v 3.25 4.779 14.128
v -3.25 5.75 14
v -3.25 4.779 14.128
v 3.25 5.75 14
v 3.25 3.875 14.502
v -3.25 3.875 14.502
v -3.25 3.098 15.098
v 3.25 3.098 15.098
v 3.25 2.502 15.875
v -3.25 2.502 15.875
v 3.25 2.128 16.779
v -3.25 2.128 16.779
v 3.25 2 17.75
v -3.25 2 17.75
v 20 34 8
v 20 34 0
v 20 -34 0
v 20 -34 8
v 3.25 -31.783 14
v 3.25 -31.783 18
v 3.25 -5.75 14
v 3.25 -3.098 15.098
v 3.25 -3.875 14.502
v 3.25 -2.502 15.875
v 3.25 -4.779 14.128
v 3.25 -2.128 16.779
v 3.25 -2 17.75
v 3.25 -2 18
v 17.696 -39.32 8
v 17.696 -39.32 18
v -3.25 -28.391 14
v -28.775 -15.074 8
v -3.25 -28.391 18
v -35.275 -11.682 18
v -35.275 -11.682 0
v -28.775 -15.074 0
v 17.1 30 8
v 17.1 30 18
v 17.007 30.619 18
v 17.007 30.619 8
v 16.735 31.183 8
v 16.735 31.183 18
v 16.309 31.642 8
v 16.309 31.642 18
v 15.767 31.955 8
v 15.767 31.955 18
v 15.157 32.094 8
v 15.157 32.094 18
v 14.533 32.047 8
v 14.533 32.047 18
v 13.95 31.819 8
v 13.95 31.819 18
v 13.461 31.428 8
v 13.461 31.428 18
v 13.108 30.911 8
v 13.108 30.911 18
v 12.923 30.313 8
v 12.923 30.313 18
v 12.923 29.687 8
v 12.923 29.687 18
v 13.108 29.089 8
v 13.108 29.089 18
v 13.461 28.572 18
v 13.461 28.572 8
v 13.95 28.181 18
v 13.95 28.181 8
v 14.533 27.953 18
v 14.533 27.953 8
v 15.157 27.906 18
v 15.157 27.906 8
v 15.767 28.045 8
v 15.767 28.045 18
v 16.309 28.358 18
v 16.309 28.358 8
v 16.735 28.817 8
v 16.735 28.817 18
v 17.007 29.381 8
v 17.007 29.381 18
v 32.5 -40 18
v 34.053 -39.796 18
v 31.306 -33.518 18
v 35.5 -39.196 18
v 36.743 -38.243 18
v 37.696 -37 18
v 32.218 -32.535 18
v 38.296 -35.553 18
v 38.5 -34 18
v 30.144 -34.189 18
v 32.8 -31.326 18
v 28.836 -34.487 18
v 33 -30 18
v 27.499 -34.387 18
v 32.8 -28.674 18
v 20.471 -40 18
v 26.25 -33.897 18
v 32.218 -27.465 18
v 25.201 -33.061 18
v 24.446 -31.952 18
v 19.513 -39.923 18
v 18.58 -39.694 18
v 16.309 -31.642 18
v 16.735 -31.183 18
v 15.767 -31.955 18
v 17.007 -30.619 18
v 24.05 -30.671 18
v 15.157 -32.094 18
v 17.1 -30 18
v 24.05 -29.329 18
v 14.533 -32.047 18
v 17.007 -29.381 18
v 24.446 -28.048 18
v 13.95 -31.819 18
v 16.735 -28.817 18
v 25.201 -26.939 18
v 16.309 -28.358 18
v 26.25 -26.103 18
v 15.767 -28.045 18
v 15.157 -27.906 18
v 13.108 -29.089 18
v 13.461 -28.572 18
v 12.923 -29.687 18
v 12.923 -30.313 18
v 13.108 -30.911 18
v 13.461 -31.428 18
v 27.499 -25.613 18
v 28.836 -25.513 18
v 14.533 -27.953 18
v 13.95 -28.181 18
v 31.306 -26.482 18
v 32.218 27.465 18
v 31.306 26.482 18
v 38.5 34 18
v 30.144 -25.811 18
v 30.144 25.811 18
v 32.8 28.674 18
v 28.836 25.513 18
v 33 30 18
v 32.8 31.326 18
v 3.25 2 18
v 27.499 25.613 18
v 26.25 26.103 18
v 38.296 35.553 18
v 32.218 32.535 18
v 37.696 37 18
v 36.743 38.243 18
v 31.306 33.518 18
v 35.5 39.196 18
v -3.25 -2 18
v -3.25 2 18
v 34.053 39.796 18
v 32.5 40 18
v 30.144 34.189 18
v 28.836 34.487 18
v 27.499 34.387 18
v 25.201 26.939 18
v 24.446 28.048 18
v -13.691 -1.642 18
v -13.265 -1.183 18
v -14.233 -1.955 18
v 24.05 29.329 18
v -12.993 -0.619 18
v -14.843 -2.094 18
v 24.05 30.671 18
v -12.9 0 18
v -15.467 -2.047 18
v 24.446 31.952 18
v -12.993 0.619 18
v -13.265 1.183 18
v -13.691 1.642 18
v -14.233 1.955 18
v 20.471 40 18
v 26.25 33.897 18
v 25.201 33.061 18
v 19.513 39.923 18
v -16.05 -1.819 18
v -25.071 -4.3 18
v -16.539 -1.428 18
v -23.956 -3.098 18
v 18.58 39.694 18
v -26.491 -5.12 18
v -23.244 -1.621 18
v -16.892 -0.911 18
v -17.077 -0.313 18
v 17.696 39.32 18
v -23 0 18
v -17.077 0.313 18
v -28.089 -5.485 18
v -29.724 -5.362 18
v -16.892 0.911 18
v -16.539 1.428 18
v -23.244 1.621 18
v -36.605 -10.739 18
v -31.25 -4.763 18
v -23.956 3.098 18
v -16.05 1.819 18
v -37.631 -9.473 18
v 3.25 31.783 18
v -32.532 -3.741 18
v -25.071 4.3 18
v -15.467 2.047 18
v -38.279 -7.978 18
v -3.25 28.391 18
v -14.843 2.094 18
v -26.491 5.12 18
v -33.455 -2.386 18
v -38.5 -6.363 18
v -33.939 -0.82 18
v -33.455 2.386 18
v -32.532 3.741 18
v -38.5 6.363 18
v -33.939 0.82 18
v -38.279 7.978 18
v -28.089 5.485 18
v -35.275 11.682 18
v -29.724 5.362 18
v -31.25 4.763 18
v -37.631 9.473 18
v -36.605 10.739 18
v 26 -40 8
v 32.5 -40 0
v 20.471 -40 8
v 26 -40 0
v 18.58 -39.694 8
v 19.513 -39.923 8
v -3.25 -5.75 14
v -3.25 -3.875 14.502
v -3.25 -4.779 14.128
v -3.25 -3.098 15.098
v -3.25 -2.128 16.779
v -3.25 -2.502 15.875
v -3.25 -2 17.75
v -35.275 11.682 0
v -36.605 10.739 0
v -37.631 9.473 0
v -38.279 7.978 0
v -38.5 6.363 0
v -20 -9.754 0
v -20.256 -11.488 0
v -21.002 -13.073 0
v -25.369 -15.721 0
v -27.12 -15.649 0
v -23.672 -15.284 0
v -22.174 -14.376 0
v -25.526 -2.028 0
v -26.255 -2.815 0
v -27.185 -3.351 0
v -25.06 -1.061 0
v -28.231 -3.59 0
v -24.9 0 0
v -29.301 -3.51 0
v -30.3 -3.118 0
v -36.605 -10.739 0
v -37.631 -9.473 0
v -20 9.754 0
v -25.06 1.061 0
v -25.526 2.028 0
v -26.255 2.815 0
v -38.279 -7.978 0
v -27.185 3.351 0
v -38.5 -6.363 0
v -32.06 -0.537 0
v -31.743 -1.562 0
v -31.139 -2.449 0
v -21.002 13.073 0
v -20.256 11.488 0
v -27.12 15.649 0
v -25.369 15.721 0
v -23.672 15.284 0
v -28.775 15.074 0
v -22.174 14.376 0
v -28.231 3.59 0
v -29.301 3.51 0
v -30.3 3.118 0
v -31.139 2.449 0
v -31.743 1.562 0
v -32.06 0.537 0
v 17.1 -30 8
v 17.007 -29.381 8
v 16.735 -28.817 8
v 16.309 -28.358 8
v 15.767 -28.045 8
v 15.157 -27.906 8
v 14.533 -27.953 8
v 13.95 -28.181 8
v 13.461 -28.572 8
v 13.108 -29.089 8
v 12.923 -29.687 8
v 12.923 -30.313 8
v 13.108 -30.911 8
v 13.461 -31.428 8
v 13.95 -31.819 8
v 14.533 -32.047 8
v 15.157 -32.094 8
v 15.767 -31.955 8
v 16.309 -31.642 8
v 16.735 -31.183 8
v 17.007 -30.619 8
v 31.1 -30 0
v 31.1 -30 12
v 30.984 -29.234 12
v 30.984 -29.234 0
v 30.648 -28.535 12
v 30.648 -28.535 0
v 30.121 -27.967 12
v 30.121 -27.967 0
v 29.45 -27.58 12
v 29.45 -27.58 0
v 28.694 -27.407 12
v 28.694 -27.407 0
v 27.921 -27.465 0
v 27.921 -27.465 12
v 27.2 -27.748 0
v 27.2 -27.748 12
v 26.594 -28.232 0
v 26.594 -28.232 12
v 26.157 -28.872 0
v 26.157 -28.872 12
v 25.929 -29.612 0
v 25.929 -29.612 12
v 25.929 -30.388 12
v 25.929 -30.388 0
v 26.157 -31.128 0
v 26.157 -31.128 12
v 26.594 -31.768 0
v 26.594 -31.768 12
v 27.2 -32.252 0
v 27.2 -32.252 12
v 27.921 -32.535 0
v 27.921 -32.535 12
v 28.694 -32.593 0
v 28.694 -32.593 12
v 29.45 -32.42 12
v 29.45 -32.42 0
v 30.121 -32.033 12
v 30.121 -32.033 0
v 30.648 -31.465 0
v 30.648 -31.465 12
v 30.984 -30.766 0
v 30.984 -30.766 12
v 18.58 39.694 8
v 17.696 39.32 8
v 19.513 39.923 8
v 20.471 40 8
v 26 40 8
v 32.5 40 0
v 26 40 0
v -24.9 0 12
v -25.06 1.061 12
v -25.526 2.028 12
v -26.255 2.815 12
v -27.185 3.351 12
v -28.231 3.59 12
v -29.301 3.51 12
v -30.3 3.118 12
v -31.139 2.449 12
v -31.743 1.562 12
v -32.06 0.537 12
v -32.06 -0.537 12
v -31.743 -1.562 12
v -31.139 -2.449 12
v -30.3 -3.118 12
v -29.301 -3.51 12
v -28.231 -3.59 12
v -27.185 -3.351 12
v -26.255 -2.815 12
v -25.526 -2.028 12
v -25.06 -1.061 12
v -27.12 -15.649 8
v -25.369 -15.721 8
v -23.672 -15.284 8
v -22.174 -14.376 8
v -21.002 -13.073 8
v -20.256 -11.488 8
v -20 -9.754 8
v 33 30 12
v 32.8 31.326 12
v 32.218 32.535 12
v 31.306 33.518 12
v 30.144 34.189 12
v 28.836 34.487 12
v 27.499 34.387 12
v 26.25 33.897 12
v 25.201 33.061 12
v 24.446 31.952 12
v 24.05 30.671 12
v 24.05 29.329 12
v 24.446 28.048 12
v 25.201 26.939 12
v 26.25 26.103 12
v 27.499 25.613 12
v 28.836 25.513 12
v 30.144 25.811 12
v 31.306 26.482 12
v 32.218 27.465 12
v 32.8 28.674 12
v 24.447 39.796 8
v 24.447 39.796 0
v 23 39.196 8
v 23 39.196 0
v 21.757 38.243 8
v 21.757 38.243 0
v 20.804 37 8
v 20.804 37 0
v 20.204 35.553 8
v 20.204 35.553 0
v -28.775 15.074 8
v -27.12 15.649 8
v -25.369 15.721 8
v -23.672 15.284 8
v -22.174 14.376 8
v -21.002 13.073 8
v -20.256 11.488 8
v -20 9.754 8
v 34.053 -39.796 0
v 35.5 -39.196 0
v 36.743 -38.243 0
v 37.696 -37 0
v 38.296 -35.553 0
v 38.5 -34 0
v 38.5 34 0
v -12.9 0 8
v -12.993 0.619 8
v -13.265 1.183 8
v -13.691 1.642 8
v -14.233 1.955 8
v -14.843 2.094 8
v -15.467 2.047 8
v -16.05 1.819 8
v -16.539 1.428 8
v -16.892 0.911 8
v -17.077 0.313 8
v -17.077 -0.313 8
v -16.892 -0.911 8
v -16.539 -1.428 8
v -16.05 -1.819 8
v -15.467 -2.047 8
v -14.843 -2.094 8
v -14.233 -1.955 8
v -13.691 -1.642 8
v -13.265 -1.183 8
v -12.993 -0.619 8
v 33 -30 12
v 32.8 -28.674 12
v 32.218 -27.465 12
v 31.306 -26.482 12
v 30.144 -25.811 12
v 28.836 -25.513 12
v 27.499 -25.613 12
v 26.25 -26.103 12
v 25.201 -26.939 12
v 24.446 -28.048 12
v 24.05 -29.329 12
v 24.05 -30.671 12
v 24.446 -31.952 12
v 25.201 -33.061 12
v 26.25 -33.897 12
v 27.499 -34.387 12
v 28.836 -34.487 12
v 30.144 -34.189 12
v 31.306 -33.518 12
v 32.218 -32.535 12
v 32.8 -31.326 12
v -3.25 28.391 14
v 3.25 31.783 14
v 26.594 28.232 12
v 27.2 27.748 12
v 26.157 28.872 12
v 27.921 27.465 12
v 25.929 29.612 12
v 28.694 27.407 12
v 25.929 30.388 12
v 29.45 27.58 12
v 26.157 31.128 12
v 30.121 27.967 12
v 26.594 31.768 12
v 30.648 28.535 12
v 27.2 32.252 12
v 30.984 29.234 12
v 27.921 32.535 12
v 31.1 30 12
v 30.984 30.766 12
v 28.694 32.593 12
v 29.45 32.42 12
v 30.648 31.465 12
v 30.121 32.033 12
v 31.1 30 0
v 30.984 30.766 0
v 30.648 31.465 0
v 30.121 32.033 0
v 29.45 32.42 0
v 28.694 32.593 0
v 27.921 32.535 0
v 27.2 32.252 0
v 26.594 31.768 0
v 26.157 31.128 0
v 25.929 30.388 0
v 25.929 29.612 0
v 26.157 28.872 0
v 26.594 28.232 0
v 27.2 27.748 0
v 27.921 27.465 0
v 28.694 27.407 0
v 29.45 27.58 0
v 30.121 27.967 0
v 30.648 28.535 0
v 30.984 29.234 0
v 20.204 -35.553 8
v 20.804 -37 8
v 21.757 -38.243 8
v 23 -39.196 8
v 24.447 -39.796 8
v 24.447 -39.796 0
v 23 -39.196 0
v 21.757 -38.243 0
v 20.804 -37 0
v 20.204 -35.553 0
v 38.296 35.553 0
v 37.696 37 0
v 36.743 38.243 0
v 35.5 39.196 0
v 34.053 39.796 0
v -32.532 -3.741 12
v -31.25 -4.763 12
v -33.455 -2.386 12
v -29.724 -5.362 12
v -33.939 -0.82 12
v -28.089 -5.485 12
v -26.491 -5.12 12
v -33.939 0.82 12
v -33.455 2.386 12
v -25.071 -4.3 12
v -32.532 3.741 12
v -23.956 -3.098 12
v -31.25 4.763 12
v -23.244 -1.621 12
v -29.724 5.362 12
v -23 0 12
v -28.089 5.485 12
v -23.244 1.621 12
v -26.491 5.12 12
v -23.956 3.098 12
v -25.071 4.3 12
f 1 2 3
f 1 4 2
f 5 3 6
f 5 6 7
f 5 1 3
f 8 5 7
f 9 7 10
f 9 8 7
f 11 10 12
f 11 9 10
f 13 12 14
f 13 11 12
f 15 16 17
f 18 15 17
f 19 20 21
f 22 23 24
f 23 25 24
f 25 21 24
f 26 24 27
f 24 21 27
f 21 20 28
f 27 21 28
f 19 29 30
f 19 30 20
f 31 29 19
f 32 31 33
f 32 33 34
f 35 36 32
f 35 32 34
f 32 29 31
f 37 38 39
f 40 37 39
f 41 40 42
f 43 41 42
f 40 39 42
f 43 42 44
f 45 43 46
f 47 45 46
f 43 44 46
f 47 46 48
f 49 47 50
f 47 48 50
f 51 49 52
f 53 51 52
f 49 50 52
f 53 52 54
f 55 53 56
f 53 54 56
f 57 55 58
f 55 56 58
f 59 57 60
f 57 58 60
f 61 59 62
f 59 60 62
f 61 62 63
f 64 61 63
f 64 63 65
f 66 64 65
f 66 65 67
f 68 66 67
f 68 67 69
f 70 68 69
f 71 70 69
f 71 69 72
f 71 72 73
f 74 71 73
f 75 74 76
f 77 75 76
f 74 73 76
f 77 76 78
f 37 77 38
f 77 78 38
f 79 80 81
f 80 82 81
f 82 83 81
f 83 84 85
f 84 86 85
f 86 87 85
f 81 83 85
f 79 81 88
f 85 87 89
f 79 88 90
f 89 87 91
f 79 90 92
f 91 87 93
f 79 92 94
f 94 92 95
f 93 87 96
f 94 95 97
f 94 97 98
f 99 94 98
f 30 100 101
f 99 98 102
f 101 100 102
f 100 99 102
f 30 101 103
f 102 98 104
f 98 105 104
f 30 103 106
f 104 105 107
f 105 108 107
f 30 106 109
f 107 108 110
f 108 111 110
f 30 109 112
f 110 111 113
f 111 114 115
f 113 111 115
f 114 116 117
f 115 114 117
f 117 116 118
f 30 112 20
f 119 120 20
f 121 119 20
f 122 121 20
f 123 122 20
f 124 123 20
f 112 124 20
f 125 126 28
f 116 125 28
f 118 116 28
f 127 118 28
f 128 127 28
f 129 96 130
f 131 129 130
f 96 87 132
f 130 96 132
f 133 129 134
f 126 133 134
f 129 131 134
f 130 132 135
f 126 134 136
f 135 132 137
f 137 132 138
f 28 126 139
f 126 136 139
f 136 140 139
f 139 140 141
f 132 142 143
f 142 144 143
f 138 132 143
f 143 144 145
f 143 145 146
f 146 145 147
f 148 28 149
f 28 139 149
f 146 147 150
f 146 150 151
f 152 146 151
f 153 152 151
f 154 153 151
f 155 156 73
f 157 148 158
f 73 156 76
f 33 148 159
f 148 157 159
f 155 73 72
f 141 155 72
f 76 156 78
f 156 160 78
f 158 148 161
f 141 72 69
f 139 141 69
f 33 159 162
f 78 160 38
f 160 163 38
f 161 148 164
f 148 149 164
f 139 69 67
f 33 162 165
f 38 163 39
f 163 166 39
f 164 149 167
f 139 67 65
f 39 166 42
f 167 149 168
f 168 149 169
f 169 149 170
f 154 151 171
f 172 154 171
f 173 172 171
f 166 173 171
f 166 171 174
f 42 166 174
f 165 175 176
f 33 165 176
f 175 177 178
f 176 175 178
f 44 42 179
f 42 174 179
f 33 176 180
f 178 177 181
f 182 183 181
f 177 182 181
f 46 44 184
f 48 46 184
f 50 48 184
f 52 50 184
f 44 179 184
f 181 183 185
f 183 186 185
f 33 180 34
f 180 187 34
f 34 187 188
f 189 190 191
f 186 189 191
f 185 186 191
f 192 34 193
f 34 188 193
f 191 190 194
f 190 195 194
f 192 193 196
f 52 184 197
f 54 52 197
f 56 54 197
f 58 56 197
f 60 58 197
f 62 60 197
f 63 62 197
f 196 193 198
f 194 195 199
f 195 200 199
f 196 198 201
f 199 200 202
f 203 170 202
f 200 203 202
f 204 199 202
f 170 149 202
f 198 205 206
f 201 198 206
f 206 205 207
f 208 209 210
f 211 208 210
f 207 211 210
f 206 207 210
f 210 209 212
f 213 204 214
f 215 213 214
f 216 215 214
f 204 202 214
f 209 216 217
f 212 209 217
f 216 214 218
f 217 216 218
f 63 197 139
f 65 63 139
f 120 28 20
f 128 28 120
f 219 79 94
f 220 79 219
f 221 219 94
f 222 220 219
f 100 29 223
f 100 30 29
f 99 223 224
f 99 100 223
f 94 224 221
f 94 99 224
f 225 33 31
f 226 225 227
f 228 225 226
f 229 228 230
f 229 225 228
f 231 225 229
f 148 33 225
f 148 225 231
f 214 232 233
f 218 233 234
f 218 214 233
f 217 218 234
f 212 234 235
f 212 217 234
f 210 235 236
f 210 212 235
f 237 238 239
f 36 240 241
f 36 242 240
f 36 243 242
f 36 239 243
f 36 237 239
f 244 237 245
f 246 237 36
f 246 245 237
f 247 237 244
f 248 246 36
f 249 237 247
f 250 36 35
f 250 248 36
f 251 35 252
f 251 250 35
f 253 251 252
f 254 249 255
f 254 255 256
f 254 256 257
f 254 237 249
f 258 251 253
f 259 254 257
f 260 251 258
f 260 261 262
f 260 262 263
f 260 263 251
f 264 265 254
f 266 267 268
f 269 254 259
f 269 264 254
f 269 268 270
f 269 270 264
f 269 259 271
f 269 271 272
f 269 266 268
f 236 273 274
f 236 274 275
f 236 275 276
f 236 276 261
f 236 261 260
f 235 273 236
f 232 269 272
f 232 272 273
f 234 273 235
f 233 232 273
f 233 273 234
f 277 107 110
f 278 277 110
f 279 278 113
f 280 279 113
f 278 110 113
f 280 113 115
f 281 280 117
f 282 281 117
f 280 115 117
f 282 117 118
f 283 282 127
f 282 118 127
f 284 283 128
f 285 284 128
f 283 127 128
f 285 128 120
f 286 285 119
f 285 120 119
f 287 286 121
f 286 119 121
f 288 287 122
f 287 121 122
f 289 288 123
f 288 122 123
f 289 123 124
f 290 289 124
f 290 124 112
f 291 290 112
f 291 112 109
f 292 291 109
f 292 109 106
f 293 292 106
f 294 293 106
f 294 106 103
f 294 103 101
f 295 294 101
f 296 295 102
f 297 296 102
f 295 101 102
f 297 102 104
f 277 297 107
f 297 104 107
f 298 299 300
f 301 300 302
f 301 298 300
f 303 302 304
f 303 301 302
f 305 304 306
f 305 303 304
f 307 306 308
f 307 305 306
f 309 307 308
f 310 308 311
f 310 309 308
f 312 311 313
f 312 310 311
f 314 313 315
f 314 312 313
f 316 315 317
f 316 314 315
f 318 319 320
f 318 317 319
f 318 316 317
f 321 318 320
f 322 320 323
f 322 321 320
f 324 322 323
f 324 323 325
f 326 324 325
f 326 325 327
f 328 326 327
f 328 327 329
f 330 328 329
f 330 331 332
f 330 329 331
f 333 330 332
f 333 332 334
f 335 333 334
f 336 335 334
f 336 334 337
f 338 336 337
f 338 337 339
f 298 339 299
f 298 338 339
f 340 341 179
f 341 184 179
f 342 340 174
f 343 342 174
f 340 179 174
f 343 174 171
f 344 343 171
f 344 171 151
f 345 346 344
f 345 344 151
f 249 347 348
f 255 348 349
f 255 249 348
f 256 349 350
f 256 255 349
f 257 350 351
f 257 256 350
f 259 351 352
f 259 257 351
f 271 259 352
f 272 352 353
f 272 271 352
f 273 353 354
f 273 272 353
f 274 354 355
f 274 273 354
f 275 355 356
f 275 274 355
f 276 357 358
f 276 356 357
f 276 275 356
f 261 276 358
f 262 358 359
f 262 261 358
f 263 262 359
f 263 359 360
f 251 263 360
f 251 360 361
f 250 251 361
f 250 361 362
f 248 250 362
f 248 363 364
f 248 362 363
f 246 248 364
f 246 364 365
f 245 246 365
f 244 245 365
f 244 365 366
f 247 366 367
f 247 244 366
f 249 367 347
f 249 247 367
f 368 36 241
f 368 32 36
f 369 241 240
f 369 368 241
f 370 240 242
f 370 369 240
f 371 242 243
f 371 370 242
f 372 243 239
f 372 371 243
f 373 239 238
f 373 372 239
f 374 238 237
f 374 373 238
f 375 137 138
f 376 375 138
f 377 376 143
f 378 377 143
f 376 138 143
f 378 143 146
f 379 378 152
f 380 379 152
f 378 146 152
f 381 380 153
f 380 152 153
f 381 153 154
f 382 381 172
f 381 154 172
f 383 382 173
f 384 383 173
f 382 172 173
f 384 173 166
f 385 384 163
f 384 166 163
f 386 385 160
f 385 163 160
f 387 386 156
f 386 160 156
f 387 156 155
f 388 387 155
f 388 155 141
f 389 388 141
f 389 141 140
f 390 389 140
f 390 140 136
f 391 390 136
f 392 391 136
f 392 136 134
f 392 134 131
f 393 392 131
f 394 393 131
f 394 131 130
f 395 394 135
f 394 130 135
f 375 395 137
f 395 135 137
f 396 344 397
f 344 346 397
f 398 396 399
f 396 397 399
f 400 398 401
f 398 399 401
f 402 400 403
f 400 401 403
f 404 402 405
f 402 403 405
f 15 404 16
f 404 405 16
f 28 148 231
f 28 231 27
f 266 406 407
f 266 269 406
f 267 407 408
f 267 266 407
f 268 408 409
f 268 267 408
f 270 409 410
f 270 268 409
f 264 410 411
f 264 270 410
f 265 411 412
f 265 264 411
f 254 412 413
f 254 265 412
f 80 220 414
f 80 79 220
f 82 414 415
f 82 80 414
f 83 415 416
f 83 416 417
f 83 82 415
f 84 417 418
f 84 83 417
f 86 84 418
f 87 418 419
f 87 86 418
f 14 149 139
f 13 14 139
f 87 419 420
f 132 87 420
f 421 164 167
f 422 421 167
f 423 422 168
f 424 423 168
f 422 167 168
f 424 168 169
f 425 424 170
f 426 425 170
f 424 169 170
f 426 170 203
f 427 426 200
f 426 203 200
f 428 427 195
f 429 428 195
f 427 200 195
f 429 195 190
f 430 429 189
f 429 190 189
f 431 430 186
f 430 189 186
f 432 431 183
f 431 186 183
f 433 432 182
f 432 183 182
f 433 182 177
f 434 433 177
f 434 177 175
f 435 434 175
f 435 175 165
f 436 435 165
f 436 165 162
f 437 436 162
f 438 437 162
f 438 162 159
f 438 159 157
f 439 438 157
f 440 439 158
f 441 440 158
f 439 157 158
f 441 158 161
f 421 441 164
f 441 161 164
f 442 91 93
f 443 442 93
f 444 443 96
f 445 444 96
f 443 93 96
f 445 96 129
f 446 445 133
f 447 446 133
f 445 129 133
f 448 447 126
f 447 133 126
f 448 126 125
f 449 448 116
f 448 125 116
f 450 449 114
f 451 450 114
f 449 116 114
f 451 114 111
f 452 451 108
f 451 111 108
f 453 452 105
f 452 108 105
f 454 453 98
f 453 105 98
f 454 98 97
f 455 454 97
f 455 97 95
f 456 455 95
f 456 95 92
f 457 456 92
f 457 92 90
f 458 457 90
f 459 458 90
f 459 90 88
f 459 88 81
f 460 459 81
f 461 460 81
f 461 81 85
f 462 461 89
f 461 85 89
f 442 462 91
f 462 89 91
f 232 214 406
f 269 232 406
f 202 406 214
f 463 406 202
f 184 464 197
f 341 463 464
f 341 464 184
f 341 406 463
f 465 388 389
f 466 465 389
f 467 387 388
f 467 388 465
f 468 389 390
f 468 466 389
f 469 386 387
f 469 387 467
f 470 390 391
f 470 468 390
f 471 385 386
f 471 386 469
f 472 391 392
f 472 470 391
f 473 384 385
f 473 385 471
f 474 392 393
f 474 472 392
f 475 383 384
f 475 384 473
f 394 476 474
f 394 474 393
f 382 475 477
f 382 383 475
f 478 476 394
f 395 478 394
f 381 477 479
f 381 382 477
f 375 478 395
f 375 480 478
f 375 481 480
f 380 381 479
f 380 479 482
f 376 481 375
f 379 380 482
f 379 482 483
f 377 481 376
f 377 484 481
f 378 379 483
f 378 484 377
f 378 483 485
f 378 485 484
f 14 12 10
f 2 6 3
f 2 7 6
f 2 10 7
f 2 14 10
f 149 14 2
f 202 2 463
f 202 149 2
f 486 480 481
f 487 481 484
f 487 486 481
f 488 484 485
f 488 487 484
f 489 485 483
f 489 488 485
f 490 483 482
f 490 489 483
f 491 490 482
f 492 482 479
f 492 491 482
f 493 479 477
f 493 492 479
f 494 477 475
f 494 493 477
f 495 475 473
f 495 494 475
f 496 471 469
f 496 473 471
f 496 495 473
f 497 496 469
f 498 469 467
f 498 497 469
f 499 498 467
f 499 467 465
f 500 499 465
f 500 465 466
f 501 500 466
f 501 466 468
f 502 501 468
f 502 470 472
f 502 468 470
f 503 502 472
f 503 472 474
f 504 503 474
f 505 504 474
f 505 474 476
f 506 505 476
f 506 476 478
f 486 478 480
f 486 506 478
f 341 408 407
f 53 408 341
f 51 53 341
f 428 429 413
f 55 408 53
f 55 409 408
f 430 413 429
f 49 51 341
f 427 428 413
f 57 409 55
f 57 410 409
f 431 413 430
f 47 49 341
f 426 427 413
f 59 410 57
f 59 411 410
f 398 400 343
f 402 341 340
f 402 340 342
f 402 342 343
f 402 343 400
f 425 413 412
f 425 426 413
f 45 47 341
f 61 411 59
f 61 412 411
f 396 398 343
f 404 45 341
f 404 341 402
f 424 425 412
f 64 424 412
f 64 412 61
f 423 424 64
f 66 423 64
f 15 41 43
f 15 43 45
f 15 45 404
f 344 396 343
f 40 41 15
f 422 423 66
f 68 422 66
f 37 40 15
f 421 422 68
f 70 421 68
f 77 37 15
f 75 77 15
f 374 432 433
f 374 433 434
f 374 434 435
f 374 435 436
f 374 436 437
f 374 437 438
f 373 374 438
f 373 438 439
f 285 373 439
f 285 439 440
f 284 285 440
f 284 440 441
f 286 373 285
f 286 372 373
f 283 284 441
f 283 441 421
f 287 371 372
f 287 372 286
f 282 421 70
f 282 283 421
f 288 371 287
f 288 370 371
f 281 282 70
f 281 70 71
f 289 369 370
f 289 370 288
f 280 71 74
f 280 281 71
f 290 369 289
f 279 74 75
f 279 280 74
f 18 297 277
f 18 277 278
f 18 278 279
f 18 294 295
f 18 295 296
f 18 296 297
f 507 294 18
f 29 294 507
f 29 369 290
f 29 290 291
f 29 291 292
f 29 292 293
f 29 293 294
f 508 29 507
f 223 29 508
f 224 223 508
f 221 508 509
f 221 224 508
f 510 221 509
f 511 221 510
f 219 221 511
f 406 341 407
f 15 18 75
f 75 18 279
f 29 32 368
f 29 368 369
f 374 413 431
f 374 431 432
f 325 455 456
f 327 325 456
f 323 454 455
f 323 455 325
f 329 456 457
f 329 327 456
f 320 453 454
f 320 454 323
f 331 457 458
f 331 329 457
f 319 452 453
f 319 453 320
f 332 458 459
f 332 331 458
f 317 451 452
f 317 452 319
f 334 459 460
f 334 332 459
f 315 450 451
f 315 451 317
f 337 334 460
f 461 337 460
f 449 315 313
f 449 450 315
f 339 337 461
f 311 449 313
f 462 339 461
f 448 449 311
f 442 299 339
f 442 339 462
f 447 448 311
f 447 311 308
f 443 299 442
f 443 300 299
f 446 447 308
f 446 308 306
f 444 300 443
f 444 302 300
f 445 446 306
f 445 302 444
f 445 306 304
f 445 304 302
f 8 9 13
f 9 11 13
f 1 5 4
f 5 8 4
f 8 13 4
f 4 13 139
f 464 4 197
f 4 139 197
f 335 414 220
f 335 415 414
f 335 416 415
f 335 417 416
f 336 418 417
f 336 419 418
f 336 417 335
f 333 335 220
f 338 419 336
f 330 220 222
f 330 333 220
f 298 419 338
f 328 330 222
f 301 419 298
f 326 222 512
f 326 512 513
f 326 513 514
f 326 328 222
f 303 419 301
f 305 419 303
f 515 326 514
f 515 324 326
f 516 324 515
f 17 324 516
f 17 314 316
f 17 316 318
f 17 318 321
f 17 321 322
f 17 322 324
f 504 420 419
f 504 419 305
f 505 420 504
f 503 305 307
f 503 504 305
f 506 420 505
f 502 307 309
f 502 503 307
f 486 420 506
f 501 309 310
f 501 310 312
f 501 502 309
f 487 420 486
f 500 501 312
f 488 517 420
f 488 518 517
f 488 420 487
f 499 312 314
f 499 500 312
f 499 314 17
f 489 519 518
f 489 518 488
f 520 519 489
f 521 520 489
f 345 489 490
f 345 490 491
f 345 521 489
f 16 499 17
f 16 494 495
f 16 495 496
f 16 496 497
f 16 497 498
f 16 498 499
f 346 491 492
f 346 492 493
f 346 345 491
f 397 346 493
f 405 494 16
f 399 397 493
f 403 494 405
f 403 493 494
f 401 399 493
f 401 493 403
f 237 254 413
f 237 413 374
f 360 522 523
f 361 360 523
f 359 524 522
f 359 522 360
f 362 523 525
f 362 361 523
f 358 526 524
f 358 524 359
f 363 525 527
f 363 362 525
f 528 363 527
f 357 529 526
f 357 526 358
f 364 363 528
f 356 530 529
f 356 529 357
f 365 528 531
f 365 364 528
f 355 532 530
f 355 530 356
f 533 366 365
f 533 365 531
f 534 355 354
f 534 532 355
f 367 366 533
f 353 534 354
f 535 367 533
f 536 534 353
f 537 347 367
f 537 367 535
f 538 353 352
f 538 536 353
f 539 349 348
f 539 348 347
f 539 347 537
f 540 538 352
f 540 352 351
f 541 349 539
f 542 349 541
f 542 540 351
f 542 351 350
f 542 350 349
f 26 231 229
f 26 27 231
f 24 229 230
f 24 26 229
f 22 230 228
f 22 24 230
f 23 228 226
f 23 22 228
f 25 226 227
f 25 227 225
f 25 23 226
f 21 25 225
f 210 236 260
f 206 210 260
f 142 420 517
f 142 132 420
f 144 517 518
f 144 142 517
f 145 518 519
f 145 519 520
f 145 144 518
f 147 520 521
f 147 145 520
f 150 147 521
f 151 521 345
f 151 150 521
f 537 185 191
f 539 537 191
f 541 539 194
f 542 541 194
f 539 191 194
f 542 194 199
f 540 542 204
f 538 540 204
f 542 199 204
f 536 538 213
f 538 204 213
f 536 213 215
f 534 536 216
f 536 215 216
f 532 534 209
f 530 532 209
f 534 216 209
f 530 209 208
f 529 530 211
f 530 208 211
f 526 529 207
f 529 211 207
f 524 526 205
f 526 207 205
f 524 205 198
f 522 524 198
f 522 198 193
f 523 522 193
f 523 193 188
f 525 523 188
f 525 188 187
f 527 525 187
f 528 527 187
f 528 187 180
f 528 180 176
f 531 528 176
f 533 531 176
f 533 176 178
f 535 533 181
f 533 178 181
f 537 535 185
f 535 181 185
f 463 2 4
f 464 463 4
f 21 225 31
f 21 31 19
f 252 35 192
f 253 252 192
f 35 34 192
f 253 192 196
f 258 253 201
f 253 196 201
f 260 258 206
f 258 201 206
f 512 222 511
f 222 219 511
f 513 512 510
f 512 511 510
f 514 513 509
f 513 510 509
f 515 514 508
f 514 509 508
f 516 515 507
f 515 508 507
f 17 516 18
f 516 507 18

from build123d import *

# Parameters (mm, degrees)
SKETCH_R        = 3.6
SKETCH_R_2      = 2.6
PAD_DEPTH       = 18
SKETCH001_R     = 3.6
POCKET_DEPTH    = 3
SKETCH002_W     = 40
SKETCH002_H     = 100
POCKET001_DEPTH = 8
SKETCH003_R     = 5.5
SKETCH003_R_2   = 4.5
POCKET002_DEPTH = 6
FILLET_R        = 6
FILLET001_R     = 6
SKETCH004_W     = 6.5
SKETCH004_H     = 33
POCKET003_DEPTH = 4
SKETCH005_R     = 2.1
POCKET004_DEPTH = 10
FILLET002_R     = 3.75


with BuildPart() as part:
    # Sketch → Pad (new body)
    with BuildSketch(Plane.XY):
        Polygon((-38.5, 0), (-38.5, 10), (19, 40), (38.5, 40), (38.5, 0), (38.5, -40), (19, -40), (-38.5, -10), align=None)
        with Locations((-28.5, 0)):
            Circle(SKETCH_R, mode=Mode.SUBTRACT)
        with Locations((28.5, -30)):
            Circle(SKETCH_R_2, mode=Mode.SUBTRACT)
        with Locations((28.5, 30)):
            Circle(SKETCH_R_2, mode=Mode.SUBTRACT)
    extrude(amount=PAD_DEPTH)

    # Sketch001 (on Face3 of Pad) → Pocket (cut)
    with BuildSketch(Plane(origin=(0, 0, 0), x_dir=(1, 0, 0), z_dir=(0, 0, -1))):
        with Locations((-28.5, 0)):
            Circle(SKETCH001_R)
    extrude(amount=-POCKET_DEPTH, mode=Mode.SUBTRACT)

    # Sketch002 (on Face3 of Pocket) → Pocket001 (cut)
    with BuildSketch(Plane(origin=(0, 0, 0), x_dir=(1, 0, 0), z_dir=(0, 0, -1))):
        Rectangle(SKETCH002_W, SKETCH002_H)
    extrude(amount=-POCKET001_DEPTH, mode=Mode.SUBTRACT)

    # Sketch003 (on Face6 of Pocket001) → Pocket002 (cut)
    with BuildSketch(Plane.XY.offset(18)):
        with Locations((-28.5, 0)):
            Circle(SKETCH003_R)
        with Locations((28.5, 30)):
            Circle(SKETCH003_R_2)
        with Locations((28.5, -30)):
            Circle(SKETCH003_R_2)
    extrude(amount=-POCKET002_DEPTH, mode=Mode.SUBTRACT)

    # Fillet
    fillet_edges = [part.edges().sort_by_distance(p)[0] for p in [
        (20, -40, 4),
        (20, 40, 4),
        (-20, -19.652174, 4),
        (-20, 19.652174, 4),
    ]]
    fillet(fillet_edges, radius=FILLET_R)

    # Fillet001
    fillet001_edges = [part.edges().sort_by_distance(p)[0] for p in [
        (-38.5, 10, 9),
        (-38.5, -10, 9),
        (19, 40, 13),
        (38.5, 40, 9),
        (38.5, -40, 9),
        (19, -40, 13),
    ]]
    fillet(fillet001_edges, radius=FILLET001_R)

    # Sketch004 (on Face5 of Fillet001) → Pocket003 (cut)
    with BuildSketch(Plane.XY.offset(18)):
        with Locations((0, -18.5)):
            Rectangle(SKETCH004_W, SKETCH004_H)
        with Locations((0, 18.5)):
            Rectangle(SKETCH004_W, SKETCH004_H)
    extrude(amount=-POCKET003_DEPTH, mode=Mode.SUBTRACT)

    # Sketch005 (on Face6 of Pocket003) → Pocket004 (cut)
    with BuildSketch(Plane.XY.offset(18)):
        with Locations((-15, 0)):
            Circle(SKETCH005_R)
        with Locations((15, -30)):
            Circle(SKETCH005_R)
        with Locations((15, 30)):
            Circle(SKETCH005_R)
    extrude(amount=-POCKET004_DEPTH, mode=Mode.SUBTRACT)

    # Fillet002
    fillet002_edges = [part.edges().sort_by_distance(p)[0] for p in [
        (0, -2, 14),
        (0, 2, 14),
    ]]
    fillet(fillet002_edges, radius=FILLET002_R)


solid = part.part
